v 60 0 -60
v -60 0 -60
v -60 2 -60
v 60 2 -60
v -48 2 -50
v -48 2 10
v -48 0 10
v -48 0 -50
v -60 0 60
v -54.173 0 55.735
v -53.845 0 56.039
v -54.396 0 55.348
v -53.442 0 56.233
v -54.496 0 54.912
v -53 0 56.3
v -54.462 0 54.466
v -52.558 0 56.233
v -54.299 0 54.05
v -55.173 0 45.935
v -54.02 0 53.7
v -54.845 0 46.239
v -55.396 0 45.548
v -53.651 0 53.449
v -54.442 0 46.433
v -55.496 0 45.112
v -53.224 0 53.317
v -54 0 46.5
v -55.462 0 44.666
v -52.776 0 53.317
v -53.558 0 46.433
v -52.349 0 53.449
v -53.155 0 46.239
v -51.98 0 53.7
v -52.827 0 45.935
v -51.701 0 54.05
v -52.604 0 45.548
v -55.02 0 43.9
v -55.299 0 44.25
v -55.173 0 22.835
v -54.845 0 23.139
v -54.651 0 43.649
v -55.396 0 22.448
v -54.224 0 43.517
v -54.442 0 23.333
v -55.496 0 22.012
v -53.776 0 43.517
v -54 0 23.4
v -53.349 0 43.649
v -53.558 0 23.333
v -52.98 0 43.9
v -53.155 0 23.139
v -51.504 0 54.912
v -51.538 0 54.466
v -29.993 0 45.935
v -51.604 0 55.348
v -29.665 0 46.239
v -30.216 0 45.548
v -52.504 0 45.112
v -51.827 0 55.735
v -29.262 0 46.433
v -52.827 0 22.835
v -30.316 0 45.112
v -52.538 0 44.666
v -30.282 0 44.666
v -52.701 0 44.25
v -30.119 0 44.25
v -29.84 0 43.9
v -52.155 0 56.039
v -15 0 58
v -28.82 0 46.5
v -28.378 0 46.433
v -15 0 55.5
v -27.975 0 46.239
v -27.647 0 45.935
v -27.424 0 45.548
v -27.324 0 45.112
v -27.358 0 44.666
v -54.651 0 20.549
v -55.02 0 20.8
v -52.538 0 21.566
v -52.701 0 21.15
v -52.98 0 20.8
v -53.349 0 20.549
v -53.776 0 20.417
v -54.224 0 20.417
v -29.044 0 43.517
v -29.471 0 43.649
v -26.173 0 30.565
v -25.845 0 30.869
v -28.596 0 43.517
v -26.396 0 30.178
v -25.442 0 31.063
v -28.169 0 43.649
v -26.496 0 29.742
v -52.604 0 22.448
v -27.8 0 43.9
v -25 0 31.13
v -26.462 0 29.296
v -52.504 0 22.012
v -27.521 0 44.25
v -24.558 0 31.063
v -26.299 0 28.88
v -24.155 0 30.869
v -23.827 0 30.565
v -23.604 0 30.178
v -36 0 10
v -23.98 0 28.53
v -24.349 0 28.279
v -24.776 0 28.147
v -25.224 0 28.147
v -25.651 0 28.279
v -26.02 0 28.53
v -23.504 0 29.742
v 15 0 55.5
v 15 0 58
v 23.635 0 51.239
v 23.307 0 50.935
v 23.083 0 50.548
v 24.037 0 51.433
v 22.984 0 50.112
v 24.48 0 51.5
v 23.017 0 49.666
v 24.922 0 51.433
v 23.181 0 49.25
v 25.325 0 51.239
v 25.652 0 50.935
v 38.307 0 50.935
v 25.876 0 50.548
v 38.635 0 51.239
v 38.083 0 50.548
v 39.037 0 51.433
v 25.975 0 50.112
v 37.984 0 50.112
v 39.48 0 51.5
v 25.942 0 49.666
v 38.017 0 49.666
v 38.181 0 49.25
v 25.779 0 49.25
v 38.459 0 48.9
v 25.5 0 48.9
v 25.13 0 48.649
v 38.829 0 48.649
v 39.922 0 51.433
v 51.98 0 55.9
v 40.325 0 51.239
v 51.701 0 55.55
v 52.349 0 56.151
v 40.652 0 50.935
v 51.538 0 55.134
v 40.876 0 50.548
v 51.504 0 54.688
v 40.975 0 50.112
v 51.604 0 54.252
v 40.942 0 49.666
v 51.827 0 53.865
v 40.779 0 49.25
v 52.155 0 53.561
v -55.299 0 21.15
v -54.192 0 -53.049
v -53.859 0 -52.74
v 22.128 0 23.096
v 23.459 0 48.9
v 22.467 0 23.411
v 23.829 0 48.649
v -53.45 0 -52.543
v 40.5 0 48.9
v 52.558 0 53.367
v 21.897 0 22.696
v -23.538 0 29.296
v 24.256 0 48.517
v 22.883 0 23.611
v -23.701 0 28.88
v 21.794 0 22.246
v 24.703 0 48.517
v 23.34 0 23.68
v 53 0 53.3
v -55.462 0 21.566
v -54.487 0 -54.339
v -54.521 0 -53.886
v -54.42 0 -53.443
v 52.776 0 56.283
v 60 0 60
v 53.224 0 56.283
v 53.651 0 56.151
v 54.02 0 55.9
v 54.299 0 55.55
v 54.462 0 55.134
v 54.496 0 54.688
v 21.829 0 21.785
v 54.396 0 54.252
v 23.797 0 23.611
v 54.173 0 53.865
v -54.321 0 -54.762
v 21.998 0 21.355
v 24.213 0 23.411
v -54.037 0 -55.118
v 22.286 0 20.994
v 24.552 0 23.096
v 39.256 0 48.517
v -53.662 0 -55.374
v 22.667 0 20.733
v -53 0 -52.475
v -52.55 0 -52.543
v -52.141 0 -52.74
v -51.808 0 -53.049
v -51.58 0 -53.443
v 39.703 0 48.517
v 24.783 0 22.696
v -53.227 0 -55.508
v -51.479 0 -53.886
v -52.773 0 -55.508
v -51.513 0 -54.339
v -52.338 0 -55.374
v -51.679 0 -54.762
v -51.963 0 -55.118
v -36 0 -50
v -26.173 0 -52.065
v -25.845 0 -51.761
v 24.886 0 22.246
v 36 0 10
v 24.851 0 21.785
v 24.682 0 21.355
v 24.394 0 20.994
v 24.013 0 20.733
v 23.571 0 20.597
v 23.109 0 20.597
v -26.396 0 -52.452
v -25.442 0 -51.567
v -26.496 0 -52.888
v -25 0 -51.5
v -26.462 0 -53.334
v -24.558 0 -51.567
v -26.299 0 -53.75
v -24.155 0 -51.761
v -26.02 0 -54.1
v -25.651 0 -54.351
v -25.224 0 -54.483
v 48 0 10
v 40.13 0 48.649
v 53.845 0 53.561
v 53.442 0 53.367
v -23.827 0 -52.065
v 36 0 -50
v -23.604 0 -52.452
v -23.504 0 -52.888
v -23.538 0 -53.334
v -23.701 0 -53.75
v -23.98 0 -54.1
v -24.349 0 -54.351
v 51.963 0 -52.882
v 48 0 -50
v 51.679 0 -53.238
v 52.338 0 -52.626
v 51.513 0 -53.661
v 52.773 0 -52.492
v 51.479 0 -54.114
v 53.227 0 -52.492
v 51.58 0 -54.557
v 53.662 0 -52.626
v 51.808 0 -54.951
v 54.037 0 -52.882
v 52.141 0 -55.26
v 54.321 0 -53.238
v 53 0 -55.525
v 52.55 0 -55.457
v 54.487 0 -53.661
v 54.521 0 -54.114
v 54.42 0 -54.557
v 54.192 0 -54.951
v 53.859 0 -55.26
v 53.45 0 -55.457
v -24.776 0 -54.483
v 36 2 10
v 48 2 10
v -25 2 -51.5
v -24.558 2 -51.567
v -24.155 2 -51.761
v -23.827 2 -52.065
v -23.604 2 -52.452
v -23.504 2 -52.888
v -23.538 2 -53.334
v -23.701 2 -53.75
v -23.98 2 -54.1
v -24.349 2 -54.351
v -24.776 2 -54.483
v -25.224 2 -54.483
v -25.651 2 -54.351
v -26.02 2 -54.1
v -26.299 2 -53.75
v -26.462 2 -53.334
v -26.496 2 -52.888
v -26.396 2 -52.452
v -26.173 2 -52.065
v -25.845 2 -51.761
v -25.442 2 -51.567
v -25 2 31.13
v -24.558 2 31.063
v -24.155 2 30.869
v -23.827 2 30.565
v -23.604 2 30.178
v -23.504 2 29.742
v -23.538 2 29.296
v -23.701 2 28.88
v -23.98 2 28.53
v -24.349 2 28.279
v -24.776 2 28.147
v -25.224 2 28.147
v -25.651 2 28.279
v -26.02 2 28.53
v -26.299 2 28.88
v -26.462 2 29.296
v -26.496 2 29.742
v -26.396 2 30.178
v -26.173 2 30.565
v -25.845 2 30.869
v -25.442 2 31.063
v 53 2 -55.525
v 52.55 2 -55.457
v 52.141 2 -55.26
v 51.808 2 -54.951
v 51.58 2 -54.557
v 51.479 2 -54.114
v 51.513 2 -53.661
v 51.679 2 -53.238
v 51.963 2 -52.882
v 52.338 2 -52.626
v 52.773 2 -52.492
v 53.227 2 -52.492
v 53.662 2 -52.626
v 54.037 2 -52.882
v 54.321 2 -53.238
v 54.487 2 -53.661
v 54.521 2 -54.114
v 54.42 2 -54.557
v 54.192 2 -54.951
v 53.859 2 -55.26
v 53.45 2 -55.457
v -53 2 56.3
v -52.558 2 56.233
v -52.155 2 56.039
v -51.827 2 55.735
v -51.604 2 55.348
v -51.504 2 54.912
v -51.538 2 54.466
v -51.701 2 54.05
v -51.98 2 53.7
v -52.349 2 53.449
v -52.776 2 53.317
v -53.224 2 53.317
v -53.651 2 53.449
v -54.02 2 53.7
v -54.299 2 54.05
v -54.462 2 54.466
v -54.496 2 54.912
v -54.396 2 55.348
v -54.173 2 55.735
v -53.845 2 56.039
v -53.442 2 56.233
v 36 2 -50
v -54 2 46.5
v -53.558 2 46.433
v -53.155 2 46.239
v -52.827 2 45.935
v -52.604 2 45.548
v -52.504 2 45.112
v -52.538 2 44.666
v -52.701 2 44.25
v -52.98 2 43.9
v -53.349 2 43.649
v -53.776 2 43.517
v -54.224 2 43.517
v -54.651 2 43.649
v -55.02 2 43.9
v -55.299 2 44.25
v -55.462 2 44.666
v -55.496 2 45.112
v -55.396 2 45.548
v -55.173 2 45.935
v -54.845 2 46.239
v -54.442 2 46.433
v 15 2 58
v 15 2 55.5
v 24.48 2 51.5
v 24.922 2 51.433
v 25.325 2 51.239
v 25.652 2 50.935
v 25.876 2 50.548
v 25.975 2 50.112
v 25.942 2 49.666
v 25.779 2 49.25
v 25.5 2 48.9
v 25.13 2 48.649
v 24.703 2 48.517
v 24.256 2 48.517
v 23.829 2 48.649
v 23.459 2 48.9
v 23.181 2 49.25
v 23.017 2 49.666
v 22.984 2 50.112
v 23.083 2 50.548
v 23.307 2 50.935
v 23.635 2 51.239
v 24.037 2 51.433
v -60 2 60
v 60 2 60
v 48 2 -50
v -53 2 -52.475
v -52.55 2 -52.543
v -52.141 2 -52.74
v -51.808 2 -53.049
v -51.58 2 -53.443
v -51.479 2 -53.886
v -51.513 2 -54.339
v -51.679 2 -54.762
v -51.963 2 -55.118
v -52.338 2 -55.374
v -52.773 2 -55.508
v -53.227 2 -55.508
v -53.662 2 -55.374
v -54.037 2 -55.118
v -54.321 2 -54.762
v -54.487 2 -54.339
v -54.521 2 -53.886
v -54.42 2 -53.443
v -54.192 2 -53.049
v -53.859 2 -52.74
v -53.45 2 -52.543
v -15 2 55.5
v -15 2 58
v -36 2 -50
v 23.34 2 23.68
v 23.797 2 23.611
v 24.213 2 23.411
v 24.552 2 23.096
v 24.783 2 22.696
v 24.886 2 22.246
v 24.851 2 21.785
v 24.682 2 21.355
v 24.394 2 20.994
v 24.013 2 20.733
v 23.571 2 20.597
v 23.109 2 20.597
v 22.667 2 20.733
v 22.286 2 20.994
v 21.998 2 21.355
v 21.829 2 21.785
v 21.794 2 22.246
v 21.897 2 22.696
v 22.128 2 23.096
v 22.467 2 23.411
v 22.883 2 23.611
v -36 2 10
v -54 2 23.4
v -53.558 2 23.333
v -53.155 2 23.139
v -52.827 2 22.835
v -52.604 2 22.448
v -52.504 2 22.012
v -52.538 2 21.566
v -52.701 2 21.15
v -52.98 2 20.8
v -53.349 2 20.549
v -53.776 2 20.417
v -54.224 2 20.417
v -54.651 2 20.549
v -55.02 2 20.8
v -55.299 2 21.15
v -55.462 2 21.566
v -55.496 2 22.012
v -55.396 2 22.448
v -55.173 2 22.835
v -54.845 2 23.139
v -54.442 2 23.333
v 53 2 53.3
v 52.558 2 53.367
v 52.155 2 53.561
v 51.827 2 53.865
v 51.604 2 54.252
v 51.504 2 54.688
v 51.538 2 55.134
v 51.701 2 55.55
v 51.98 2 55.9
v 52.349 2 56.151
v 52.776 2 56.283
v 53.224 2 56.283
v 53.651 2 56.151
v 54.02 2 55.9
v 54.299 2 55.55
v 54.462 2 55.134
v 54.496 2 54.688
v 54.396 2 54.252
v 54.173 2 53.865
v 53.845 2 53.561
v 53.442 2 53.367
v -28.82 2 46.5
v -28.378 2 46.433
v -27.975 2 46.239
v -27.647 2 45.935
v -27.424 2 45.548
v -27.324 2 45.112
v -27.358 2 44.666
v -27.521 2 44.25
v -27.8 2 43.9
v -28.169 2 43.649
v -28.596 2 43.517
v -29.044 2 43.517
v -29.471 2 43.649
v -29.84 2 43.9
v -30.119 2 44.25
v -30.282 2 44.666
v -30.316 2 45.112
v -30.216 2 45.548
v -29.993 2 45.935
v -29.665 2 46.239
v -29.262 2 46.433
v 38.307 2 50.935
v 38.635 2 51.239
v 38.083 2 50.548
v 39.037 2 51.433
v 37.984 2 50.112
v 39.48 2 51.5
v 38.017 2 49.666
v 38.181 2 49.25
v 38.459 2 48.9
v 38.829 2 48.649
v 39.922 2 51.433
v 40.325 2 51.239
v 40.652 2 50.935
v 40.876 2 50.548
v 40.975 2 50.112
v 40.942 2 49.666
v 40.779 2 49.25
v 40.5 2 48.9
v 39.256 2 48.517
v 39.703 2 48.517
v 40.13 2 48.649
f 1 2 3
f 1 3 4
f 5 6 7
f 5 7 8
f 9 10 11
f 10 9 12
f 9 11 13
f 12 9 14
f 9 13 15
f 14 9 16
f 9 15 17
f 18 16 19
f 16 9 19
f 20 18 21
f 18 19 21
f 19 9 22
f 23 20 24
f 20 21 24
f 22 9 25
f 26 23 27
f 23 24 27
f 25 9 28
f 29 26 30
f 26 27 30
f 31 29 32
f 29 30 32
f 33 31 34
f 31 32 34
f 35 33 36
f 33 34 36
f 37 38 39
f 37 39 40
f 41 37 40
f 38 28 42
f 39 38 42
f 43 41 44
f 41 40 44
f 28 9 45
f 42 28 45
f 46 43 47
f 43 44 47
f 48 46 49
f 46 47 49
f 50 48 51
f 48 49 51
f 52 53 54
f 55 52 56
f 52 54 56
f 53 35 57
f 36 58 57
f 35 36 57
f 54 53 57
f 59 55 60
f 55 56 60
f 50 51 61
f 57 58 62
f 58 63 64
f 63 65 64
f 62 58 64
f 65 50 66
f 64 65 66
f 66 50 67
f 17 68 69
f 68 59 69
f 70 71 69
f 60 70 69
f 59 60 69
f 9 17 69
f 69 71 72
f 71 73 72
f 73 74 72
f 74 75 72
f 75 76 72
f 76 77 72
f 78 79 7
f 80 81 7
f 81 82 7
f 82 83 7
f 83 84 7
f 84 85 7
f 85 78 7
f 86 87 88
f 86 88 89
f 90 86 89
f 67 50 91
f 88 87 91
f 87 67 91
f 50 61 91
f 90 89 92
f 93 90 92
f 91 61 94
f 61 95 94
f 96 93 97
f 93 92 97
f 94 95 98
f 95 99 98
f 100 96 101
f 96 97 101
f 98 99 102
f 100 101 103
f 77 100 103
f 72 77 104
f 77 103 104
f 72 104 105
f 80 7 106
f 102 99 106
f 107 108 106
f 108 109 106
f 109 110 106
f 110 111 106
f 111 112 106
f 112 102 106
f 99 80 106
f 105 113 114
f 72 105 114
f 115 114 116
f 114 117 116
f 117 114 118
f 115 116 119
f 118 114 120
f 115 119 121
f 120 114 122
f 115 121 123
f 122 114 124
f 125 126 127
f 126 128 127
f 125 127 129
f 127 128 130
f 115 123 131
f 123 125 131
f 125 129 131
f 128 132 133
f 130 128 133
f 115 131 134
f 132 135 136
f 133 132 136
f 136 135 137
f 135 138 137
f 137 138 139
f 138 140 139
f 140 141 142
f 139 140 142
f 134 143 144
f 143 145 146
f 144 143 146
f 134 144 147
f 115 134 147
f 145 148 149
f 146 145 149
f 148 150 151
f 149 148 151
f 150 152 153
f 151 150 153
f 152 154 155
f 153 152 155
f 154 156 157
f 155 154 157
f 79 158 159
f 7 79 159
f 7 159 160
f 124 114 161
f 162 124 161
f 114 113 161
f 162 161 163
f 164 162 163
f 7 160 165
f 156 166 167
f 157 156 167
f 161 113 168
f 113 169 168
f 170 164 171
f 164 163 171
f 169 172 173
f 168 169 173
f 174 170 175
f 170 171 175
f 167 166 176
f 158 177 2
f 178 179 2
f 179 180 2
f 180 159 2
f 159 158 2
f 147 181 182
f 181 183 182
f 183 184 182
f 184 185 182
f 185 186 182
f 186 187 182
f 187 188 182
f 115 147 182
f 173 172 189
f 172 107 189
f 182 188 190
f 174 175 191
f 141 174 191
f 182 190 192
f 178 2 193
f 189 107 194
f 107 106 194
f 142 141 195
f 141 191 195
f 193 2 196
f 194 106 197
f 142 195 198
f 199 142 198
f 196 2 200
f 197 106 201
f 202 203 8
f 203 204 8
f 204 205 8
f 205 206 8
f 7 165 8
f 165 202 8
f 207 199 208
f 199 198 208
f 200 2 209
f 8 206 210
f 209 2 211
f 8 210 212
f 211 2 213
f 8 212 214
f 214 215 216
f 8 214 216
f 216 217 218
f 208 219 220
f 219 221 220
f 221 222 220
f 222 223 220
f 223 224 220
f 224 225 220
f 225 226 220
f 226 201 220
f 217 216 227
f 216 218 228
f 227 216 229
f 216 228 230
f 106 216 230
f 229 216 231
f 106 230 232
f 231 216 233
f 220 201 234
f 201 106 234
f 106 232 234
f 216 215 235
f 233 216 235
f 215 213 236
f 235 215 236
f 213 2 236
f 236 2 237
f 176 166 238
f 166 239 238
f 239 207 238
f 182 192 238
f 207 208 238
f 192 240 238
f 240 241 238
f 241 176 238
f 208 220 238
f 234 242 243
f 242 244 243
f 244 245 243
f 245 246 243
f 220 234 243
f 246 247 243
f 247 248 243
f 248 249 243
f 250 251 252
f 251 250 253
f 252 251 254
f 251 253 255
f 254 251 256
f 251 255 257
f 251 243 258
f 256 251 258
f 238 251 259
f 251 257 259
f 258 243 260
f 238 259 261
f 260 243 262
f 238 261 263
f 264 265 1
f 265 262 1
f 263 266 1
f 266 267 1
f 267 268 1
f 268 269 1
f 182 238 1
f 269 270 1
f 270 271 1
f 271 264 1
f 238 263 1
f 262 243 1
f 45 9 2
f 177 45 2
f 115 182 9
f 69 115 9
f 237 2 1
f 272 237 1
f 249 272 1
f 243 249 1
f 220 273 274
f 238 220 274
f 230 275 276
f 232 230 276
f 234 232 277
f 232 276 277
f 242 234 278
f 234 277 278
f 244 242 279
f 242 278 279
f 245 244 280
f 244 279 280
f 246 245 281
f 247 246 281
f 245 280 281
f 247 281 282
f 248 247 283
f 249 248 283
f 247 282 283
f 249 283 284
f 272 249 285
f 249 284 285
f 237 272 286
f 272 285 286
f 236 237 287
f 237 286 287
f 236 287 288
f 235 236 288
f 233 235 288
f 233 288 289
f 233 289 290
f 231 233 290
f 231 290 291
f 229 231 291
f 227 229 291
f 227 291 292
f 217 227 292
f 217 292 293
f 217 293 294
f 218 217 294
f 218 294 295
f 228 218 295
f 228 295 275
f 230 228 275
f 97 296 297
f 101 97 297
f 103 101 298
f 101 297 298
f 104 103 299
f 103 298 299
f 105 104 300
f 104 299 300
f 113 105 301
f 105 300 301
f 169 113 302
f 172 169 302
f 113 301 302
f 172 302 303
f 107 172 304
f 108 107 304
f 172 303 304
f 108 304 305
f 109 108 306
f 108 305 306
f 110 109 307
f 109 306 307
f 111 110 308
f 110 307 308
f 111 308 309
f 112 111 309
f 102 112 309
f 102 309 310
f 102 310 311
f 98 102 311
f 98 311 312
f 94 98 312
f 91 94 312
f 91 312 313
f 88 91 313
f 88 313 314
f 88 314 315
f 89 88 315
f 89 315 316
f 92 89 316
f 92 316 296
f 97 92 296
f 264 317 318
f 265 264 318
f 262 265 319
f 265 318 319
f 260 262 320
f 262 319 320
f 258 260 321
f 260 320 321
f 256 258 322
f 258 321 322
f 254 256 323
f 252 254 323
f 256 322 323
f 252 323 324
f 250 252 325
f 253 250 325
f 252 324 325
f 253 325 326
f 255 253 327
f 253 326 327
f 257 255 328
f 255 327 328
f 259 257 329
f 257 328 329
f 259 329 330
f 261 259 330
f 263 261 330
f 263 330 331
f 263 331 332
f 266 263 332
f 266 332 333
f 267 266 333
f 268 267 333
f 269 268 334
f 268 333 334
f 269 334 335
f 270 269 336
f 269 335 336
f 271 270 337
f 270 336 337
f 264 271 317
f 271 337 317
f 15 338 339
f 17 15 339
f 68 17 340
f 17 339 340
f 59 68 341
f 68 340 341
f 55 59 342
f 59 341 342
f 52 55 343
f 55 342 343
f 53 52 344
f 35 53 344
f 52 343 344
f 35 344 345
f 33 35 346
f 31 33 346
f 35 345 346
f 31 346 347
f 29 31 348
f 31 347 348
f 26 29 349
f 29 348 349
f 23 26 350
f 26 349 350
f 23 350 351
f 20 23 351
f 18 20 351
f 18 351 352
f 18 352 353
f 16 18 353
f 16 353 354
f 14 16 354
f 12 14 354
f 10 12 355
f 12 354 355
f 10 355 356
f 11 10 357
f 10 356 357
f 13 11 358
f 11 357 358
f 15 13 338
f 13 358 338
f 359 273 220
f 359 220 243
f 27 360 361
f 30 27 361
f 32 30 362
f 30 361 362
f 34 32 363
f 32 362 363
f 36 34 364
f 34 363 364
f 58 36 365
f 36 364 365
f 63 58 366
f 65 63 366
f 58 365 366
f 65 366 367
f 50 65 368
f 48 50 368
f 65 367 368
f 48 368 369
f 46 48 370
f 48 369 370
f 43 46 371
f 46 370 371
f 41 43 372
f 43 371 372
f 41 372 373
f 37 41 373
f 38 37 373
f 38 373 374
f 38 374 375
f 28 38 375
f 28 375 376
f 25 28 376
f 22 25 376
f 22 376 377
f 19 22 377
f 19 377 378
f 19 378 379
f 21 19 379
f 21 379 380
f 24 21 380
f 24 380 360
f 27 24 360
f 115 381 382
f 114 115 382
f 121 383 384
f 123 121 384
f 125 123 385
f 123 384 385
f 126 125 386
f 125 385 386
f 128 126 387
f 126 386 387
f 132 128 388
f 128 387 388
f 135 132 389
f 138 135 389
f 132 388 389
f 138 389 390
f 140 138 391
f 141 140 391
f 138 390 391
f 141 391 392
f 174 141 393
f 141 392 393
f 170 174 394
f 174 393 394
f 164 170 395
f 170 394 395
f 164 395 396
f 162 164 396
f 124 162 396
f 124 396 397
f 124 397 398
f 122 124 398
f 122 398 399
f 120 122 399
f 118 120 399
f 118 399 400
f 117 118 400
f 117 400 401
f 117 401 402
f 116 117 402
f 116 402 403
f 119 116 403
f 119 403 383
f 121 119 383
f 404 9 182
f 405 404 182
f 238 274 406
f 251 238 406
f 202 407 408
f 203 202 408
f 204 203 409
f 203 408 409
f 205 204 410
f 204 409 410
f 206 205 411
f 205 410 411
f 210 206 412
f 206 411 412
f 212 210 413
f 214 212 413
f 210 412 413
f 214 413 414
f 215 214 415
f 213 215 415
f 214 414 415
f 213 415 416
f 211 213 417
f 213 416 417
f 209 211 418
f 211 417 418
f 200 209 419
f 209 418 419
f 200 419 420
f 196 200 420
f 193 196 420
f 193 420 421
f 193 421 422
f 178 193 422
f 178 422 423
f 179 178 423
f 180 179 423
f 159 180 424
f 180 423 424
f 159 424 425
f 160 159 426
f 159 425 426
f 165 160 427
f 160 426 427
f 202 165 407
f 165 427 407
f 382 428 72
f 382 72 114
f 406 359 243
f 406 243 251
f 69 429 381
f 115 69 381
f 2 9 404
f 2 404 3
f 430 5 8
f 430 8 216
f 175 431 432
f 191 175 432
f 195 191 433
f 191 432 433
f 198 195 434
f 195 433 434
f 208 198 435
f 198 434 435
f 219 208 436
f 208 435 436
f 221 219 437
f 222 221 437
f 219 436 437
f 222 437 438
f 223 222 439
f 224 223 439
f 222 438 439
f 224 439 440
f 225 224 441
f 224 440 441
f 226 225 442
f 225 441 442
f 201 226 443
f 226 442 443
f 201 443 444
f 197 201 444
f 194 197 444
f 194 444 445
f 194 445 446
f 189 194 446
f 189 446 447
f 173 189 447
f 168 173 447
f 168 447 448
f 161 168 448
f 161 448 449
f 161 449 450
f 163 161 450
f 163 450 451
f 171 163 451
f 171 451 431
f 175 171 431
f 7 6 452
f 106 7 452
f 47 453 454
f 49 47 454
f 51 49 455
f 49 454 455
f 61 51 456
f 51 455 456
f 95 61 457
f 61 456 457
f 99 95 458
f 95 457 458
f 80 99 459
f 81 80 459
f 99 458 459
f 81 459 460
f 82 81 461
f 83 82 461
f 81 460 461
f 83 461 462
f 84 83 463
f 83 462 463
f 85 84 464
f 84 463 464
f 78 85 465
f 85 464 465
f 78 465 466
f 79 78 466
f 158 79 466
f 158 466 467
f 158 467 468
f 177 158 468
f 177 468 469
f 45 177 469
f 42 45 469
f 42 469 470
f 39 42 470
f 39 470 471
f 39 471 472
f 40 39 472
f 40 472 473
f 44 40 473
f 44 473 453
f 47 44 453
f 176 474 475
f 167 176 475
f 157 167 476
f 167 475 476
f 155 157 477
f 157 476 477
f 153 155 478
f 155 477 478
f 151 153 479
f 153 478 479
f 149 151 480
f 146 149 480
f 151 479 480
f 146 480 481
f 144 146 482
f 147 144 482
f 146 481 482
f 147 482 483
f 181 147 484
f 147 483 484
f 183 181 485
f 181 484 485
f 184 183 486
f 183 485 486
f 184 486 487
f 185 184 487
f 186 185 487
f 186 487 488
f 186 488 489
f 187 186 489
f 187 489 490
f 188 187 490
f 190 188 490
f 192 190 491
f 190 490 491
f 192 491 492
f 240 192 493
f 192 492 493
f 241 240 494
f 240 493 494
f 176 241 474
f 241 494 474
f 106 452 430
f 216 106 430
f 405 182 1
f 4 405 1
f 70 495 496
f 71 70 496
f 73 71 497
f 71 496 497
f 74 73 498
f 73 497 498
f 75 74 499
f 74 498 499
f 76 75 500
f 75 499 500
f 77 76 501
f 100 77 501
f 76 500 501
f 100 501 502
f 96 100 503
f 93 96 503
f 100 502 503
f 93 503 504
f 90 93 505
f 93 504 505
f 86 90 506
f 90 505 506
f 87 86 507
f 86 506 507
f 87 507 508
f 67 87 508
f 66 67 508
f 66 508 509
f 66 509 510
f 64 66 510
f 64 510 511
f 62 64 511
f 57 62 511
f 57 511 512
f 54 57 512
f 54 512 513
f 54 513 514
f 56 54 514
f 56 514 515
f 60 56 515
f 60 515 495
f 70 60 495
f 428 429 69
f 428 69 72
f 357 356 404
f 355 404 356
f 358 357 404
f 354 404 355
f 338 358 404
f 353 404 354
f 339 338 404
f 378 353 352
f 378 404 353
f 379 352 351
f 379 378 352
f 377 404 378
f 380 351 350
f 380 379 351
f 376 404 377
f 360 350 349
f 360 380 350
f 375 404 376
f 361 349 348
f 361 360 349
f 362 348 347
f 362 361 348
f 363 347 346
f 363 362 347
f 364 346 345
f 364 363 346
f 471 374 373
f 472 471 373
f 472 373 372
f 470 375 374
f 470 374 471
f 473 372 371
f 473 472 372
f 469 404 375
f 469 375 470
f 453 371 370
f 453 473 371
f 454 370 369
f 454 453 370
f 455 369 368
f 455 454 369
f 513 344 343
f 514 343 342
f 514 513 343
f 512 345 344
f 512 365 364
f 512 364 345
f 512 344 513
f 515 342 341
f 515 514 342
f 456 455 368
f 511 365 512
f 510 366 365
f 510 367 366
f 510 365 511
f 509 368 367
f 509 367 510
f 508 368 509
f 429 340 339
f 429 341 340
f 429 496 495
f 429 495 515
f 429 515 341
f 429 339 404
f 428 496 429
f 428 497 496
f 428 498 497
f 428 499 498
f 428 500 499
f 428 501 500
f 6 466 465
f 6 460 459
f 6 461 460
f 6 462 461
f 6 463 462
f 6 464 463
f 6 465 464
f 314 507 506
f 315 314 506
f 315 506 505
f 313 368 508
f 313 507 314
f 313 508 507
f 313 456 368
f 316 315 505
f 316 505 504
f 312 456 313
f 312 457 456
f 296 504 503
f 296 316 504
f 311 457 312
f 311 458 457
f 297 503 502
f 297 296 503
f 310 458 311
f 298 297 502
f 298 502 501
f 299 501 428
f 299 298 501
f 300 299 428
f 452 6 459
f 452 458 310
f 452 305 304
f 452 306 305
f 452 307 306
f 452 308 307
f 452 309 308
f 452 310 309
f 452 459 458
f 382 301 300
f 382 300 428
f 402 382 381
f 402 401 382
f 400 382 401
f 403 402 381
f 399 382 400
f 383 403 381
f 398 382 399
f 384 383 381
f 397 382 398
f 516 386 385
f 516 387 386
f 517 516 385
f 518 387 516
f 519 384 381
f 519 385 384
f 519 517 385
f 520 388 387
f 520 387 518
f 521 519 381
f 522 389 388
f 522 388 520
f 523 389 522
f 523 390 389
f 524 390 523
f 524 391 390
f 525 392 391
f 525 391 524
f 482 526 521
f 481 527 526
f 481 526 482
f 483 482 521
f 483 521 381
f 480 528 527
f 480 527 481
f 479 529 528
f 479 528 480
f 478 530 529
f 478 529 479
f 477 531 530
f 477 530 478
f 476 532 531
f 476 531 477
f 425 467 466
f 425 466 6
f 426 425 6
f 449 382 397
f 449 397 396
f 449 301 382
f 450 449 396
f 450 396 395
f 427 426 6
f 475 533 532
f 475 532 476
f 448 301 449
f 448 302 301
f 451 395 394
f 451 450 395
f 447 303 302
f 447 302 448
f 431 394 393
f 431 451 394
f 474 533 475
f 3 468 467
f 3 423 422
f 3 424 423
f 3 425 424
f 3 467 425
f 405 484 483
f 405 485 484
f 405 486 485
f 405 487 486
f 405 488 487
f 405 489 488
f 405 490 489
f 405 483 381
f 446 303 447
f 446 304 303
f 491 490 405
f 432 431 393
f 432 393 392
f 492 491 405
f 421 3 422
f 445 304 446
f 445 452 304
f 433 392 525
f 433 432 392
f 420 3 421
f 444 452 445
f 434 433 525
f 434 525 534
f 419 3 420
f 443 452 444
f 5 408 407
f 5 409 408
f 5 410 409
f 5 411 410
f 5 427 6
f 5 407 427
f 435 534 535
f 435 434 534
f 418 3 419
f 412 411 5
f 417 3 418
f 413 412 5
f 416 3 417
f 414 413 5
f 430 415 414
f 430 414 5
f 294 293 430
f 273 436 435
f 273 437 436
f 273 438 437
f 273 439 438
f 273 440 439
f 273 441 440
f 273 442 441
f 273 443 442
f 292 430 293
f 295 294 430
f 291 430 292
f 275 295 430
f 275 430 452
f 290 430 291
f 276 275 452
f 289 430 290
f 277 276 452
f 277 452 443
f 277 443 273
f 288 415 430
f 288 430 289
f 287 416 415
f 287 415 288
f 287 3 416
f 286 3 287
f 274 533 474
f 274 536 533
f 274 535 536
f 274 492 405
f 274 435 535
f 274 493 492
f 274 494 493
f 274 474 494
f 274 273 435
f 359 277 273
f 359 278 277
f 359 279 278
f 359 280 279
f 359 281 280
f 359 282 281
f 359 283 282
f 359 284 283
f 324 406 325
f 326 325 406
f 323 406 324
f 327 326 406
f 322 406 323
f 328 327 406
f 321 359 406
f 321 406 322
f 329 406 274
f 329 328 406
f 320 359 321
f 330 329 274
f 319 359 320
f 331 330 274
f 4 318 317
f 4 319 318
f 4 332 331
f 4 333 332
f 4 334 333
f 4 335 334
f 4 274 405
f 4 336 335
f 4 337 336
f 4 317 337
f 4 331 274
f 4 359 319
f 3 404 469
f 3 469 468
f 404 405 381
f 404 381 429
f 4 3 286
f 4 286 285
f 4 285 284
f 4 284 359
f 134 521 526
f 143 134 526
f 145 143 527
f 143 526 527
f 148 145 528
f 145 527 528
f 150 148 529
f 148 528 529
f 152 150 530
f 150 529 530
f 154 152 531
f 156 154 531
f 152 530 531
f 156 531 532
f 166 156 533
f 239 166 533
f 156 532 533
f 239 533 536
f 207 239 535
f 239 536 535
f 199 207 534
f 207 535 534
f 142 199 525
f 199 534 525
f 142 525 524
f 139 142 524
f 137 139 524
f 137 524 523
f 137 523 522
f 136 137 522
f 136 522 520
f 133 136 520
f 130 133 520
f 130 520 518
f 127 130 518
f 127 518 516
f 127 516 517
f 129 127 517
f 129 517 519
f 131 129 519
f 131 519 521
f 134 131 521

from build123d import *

# Parameters (mm, degrees)
SKETCH1_W           = 120
SKETCH1_H           = 120
BOSS_EXTRUDE1_DEPTH = 2
SKETCH2_R           = 1.525
SKETCH2_R_2         = 1.5
CUT_EXTRUDE1_DEPTH  = 2
SKETCH4_R           = 1.5
SKETCH4_R_2         = 1.55
SKETCH4_W           = 12
SKETCH4_H           = 60
CUT_EXTRUDE2_DEPTH  = 85.876380696
SKETCH5_R           = 1.5
SKETCH5_W           = 30
SKETCH5_H           = 2.5
CUT_EXTRUDE3_DEPTH  = 85.876380696


with BuildPart() as part:
    # Sketch1 → Boss-Extrude1 (new body)
    with BuildSketch(Plane(origin=(0, 0, 0), x_dir=(1, 0, 0), z_dir=(0, 1, 0))):
        Rectangle(SKETCH1_W, SKETCH1_H)
    extrude(amount=BOSS_EXTRUDE1_DEPTH)

    # Sketch2 → Cut-Extrude1 (cut)
    with BuildSketch(Plane(origin=(0, 2, 0), x_dir=(1, 0, 0), z_dir=(0, 1, 0))):
        with Locations(Location((-53, 54, 0), (0, 0, 270))):
            Circle(SKETCH2_R)
        with Locations(Location((-53, -54.8, 0), (0, 0, 270))):
            Circle(SKETCH2_R_2)
        with Locations(Location((53, 54, 0), (0, 0, 90))):
            Circle(SKETCH2_R)
        with Locations(Location((53, -54.8, 0), (0, 0, 90))):
            Circle(SKETCH2_R_2)
    extrude(amount=-CUT_EXTRUDE1_DEPTH, mode=Mode.SUBTRACT)

    # Sketch4 → Cut-Extrude2 (cut, through all)
    with BuildSketch(Plane(origin=(0, 2, 0), x_dir=(1, 0, 0), z_dir=(0, 1, 0))):
        with Locations(Location((-25, 53, 0), (0, 0, 270))):
            Circle(SKETCH4_R)
        with Locations(Location((-25, -29.63, 0), (0, 0, 270))):
            Circle(SKETCH4_R)
        with Locations(Location((23.34, -22.13, 0), (0, 0, 270))):
            Circle(SKETCH4_R_2)
        with Locations((-42, 20)):
            Rectangle(SKETCH4_W, SKETCH4_H)
        with Locations((42, 20)):
            Rectangle(SKETCH4_W, SKETCH4_H)
    extrude(amount=-CUT_EXTRUDE2_DEPTH, mode=Mode.SUBTRACT)

    # Sketch5 → Cut-Extrude3 (cut, through all)
    with BuildSketch(Plane(origin=(0, 2, 0), x_dir=(1, 0, 0), z_dir=(0, 1, 0))):
        with Locations(Location((-54, -45, 0), (0, 0, 270))):
            Circle(SKETCH5_R)
        with Locations(Location((-28.82, -45, 0), (0, 0, 270))):
            Circle(SKETCH5_R)
        with Locations(Location((-54, -21.9, 0), (0, 0, 270))):
            Circle(SKETCH5_R)
        with Locations(Location((24.479587092, -50, 0), (0, 0, 270))):
            Circle(SKETCH5_R)
        with Locations(Location((39.479587092, -50, 0), (0, 0, 270))):
            Circle(SKETCH5_R)
        with Locations((0, -56.75)):
            Rectangle(SKETCH5_W, SKETCH5_H)
    extrude(amount=-CUT_EXTRUDE3_DEPTH, mode=Mode.SUBTRACT)


solid = part.part
